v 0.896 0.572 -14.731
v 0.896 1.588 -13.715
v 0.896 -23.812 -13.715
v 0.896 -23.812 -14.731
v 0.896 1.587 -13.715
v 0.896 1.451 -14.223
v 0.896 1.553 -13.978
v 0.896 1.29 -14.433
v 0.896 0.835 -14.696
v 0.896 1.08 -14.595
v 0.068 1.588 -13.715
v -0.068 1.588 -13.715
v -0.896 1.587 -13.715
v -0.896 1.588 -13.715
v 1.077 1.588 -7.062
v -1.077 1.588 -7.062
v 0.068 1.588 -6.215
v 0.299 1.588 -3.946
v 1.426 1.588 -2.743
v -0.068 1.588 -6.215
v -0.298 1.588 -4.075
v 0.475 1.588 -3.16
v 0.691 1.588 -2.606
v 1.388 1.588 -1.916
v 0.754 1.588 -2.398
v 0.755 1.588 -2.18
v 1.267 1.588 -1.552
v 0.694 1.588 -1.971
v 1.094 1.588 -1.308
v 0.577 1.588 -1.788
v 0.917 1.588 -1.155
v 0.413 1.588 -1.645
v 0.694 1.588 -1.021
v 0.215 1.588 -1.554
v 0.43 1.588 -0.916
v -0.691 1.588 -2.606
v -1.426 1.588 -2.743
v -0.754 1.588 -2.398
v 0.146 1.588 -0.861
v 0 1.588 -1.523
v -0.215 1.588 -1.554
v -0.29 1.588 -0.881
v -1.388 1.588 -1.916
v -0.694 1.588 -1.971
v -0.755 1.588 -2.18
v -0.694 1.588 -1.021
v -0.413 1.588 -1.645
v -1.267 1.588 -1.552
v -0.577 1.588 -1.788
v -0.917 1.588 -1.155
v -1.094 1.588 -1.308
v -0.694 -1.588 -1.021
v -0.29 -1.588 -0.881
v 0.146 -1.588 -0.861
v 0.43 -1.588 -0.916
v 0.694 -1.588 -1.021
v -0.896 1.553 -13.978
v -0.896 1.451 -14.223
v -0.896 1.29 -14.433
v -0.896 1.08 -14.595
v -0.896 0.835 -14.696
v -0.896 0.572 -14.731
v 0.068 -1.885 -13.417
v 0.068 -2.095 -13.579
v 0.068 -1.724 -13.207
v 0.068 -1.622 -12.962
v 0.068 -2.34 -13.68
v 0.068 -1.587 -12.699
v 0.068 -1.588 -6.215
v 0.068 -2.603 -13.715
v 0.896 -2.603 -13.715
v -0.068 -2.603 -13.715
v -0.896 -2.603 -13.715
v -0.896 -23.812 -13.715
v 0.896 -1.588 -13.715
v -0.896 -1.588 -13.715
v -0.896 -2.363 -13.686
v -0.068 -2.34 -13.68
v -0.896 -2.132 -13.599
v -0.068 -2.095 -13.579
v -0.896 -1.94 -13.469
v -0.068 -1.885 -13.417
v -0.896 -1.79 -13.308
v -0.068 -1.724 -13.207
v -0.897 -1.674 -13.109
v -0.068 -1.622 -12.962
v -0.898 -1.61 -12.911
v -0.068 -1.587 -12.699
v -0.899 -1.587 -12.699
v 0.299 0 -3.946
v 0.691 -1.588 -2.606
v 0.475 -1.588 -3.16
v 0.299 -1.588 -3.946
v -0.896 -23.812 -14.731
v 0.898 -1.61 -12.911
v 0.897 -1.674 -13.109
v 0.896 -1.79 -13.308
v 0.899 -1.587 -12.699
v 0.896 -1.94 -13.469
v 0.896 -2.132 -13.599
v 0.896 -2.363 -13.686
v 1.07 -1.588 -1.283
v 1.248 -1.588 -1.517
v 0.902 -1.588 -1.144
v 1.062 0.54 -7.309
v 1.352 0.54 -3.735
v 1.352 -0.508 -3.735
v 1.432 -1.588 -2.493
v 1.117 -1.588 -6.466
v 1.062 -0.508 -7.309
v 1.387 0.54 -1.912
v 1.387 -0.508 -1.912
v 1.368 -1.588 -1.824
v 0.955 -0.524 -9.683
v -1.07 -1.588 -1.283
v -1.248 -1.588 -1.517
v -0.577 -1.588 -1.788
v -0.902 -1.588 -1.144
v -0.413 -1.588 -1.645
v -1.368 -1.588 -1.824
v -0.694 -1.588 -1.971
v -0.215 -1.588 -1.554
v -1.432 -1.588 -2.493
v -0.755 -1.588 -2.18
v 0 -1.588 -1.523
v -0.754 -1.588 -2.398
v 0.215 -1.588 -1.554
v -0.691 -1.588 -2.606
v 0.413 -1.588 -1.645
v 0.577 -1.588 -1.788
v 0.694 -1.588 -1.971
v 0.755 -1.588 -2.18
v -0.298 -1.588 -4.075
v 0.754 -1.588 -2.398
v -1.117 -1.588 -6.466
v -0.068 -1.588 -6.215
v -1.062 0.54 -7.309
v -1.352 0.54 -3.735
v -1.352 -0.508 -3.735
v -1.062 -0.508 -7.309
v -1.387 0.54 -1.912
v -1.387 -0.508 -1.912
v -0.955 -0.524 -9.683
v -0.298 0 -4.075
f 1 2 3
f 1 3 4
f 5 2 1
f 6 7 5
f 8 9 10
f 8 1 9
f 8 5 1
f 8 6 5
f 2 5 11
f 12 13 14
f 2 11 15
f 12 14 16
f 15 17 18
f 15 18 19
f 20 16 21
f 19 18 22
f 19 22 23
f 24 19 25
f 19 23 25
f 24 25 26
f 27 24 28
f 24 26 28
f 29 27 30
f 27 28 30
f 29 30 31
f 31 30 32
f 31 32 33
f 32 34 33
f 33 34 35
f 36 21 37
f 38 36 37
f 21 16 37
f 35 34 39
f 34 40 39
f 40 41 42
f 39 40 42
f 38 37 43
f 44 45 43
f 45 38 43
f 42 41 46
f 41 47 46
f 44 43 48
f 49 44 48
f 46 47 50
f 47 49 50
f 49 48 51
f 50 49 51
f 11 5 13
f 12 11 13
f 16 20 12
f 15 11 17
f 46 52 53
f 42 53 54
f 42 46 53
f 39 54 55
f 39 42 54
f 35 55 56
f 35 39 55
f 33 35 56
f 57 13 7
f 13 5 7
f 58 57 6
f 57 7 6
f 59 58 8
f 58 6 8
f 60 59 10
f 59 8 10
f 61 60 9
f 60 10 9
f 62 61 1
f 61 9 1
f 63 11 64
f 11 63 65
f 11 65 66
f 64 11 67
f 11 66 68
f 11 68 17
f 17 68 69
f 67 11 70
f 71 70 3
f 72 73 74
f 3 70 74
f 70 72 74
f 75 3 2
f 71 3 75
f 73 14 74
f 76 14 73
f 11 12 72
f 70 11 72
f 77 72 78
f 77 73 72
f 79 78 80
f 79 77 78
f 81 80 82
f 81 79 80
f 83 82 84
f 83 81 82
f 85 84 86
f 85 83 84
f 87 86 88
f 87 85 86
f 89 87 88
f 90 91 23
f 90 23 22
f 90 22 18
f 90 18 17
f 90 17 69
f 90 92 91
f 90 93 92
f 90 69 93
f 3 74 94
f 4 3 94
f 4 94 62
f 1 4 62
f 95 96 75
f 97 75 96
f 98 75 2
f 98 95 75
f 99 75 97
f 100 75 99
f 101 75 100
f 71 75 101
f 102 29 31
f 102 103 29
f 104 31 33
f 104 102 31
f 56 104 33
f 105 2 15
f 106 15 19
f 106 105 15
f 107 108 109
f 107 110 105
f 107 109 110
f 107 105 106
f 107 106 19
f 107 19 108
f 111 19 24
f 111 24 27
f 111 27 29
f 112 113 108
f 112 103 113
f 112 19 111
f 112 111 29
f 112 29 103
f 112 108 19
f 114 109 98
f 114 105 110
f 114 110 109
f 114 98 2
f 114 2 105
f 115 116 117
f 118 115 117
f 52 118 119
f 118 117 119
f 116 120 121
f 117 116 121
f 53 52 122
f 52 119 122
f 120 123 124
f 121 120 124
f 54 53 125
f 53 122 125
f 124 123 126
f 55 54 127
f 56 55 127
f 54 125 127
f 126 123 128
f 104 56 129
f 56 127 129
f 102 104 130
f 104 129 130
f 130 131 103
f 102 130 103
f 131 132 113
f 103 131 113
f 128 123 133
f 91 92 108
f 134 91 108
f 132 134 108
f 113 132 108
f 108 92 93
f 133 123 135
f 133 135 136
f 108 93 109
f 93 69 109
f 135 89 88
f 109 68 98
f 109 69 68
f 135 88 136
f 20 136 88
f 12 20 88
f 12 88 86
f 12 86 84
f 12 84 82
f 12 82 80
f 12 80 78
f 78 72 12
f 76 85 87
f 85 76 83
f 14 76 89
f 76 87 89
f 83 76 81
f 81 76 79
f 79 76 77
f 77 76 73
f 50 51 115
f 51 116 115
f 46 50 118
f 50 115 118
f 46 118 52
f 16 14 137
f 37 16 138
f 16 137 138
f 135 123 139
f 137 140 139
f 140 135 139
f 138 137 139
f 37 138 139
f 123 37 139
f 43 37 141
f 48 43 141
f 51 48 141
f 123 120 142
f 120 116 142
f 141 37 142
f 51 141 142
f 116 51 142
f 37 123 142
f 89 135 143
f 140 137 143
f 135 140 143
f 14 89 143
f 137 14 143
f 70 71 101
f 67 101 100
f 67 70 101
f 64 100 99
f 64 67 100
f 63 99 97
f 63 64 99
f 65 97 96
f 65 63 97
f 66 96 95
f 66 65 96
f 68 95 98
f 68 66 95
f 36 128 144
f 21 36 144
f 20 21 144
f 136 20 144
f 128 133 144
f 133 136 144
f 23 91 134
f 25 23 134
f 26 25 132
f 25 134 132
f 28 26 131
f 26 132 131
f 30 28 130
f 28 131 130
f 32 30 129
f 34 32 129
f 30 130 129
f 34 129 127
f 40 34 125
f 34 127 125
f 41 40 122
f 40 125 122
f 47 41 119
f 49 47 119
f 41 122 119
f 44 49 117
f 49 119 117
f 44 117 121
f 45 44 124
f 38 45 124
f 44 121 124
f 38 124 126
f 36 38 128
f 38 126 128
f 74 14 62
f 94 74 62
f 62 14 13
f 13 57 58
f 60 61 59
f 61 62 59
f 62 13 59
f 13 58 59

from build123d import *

# Parameters (mm, degrees)
BOSS_EXTRUDE1_DEPTH      = 1.5875
BOSS_EXTRUDE1_DEPTH_BACK = 1.5875
FILLET1_R                = 1.524
BOSS_EXTRUDE2_DEPTH      = 0.89581
BOSS_EXTRUDE2_DEPTH_BACK = 0.89581
FILLET2_R                = 1.016


with BuildPart() as part:
    # Sketch1 → Boss-Extrude1 (new, two sides: drawn at the far end of the back side and taken through both)
    with BuildSketch(Plane(origin=(0, 0, 0), x_dir=(1, 0, 0), z_dir=(0, 1, 0)).offset(-BOSS_EXTRUDE1_DEPTH_BACK)):
        with BuildLine():
            Line((-0.068296764, 6.214618695), (-0.068296764, 13.71487153))
            Line((-0.068296764, 13.71487153), (-0.895808533, 13.71487153))
            add(Edge.make_bspline(
                [(-0.895808533, 13.71487153), (-0.895808533, 4.54222596), (-1.588668774, 2.219313027), (-2.088196173, 1.337696034), (0, 0.766240154)],
                knots=[0, 0, 0, 0, 0, 1, 1, 1, 1, 1], degree=4))
            add(Edge.make_bspline(
                [(0.895808533, 13.71487153), (0.895808533, 4.54222596), (1.588668774, 2.219313027), (2.088196173, 1.337696034), (0, 0.766240154)],
                knots=[0, 0, 0, 0, 0, 1, 1, 1, 1, 1], degree=4))
            Line((0.895808533, 13.71487153), (0.068296764, 13.71487153))
            Line((0.068296764, 13.71487153), (0.068296764, 6.214618695))
            add(Edge.make_bspline(
                [(0.690807422, 2.606475487), (0.218071276, 3.482132924), (0.068296764, 6.214618695)],
                knots=[0, 0, 0, 1, 1, 1], degree=2))
            ThreePointArc((0.690807422, 2.606475487), (0, 1.52287153), (-0.690807422, 2.606475487))
            add(Edge.make_bspline(
                [(-0.690807422, 2.606475487), (-0.217222133, 3.738734236), (-0.068296764, 6.214618695)],
                knots=[0, 0, 0, 1, 1, 1], degree=2))
        make_face()
    extrude(amount=BOSS_EXTRUDE1_DEPTH + BOSS_EXTRUDE1_DEPTH_BACK)

    # Fillet1
    fillet1_edges = [part.edges().sort_by_distance(p)[0] for p in [
        (0, -0.79375, -0.766240154),
    ]]
    fillet(fillet1_edges, radius=FILLET1_R)

    # Sketch2 → Boss-Extrude2 (add, two sides: drawn at the far end of the back side and taken through both)
    with BuildSketch(Plane(origin=(0, 0, 0), x_dir=(0, 0, -1), z_dir=(1, 0, 0)).offset(-BOSS_EXTRUDE2_DEPTH_BACK)):
        Polygon((13.71487153, 1.5875), (13.71487153, -1.5875), (13.71487153, -23.8125), (14.73087153, -23.8125), (14.73087153, 1.5875), align=None)
    extrude(amount=BOSS_EXTRUDE2_DEPTH + BOSS_EXTRUDE2_DEPTH_BACK)

    # Fillet2
    fillet2_edges = [part.edges().sort_by_distance(p)[0] for p in [
        (0, 1.5875, -14.73087153),
        (0.482052648, -1.5875, -13.71487153),
        (-0.482052648, -1.5875, -13.71487153),
    ]]
    fillet(fillet2_edges, radius=FILLET2_R - 0.0001)  # a hair under: the kernel refuses the full size


solid = part.part
